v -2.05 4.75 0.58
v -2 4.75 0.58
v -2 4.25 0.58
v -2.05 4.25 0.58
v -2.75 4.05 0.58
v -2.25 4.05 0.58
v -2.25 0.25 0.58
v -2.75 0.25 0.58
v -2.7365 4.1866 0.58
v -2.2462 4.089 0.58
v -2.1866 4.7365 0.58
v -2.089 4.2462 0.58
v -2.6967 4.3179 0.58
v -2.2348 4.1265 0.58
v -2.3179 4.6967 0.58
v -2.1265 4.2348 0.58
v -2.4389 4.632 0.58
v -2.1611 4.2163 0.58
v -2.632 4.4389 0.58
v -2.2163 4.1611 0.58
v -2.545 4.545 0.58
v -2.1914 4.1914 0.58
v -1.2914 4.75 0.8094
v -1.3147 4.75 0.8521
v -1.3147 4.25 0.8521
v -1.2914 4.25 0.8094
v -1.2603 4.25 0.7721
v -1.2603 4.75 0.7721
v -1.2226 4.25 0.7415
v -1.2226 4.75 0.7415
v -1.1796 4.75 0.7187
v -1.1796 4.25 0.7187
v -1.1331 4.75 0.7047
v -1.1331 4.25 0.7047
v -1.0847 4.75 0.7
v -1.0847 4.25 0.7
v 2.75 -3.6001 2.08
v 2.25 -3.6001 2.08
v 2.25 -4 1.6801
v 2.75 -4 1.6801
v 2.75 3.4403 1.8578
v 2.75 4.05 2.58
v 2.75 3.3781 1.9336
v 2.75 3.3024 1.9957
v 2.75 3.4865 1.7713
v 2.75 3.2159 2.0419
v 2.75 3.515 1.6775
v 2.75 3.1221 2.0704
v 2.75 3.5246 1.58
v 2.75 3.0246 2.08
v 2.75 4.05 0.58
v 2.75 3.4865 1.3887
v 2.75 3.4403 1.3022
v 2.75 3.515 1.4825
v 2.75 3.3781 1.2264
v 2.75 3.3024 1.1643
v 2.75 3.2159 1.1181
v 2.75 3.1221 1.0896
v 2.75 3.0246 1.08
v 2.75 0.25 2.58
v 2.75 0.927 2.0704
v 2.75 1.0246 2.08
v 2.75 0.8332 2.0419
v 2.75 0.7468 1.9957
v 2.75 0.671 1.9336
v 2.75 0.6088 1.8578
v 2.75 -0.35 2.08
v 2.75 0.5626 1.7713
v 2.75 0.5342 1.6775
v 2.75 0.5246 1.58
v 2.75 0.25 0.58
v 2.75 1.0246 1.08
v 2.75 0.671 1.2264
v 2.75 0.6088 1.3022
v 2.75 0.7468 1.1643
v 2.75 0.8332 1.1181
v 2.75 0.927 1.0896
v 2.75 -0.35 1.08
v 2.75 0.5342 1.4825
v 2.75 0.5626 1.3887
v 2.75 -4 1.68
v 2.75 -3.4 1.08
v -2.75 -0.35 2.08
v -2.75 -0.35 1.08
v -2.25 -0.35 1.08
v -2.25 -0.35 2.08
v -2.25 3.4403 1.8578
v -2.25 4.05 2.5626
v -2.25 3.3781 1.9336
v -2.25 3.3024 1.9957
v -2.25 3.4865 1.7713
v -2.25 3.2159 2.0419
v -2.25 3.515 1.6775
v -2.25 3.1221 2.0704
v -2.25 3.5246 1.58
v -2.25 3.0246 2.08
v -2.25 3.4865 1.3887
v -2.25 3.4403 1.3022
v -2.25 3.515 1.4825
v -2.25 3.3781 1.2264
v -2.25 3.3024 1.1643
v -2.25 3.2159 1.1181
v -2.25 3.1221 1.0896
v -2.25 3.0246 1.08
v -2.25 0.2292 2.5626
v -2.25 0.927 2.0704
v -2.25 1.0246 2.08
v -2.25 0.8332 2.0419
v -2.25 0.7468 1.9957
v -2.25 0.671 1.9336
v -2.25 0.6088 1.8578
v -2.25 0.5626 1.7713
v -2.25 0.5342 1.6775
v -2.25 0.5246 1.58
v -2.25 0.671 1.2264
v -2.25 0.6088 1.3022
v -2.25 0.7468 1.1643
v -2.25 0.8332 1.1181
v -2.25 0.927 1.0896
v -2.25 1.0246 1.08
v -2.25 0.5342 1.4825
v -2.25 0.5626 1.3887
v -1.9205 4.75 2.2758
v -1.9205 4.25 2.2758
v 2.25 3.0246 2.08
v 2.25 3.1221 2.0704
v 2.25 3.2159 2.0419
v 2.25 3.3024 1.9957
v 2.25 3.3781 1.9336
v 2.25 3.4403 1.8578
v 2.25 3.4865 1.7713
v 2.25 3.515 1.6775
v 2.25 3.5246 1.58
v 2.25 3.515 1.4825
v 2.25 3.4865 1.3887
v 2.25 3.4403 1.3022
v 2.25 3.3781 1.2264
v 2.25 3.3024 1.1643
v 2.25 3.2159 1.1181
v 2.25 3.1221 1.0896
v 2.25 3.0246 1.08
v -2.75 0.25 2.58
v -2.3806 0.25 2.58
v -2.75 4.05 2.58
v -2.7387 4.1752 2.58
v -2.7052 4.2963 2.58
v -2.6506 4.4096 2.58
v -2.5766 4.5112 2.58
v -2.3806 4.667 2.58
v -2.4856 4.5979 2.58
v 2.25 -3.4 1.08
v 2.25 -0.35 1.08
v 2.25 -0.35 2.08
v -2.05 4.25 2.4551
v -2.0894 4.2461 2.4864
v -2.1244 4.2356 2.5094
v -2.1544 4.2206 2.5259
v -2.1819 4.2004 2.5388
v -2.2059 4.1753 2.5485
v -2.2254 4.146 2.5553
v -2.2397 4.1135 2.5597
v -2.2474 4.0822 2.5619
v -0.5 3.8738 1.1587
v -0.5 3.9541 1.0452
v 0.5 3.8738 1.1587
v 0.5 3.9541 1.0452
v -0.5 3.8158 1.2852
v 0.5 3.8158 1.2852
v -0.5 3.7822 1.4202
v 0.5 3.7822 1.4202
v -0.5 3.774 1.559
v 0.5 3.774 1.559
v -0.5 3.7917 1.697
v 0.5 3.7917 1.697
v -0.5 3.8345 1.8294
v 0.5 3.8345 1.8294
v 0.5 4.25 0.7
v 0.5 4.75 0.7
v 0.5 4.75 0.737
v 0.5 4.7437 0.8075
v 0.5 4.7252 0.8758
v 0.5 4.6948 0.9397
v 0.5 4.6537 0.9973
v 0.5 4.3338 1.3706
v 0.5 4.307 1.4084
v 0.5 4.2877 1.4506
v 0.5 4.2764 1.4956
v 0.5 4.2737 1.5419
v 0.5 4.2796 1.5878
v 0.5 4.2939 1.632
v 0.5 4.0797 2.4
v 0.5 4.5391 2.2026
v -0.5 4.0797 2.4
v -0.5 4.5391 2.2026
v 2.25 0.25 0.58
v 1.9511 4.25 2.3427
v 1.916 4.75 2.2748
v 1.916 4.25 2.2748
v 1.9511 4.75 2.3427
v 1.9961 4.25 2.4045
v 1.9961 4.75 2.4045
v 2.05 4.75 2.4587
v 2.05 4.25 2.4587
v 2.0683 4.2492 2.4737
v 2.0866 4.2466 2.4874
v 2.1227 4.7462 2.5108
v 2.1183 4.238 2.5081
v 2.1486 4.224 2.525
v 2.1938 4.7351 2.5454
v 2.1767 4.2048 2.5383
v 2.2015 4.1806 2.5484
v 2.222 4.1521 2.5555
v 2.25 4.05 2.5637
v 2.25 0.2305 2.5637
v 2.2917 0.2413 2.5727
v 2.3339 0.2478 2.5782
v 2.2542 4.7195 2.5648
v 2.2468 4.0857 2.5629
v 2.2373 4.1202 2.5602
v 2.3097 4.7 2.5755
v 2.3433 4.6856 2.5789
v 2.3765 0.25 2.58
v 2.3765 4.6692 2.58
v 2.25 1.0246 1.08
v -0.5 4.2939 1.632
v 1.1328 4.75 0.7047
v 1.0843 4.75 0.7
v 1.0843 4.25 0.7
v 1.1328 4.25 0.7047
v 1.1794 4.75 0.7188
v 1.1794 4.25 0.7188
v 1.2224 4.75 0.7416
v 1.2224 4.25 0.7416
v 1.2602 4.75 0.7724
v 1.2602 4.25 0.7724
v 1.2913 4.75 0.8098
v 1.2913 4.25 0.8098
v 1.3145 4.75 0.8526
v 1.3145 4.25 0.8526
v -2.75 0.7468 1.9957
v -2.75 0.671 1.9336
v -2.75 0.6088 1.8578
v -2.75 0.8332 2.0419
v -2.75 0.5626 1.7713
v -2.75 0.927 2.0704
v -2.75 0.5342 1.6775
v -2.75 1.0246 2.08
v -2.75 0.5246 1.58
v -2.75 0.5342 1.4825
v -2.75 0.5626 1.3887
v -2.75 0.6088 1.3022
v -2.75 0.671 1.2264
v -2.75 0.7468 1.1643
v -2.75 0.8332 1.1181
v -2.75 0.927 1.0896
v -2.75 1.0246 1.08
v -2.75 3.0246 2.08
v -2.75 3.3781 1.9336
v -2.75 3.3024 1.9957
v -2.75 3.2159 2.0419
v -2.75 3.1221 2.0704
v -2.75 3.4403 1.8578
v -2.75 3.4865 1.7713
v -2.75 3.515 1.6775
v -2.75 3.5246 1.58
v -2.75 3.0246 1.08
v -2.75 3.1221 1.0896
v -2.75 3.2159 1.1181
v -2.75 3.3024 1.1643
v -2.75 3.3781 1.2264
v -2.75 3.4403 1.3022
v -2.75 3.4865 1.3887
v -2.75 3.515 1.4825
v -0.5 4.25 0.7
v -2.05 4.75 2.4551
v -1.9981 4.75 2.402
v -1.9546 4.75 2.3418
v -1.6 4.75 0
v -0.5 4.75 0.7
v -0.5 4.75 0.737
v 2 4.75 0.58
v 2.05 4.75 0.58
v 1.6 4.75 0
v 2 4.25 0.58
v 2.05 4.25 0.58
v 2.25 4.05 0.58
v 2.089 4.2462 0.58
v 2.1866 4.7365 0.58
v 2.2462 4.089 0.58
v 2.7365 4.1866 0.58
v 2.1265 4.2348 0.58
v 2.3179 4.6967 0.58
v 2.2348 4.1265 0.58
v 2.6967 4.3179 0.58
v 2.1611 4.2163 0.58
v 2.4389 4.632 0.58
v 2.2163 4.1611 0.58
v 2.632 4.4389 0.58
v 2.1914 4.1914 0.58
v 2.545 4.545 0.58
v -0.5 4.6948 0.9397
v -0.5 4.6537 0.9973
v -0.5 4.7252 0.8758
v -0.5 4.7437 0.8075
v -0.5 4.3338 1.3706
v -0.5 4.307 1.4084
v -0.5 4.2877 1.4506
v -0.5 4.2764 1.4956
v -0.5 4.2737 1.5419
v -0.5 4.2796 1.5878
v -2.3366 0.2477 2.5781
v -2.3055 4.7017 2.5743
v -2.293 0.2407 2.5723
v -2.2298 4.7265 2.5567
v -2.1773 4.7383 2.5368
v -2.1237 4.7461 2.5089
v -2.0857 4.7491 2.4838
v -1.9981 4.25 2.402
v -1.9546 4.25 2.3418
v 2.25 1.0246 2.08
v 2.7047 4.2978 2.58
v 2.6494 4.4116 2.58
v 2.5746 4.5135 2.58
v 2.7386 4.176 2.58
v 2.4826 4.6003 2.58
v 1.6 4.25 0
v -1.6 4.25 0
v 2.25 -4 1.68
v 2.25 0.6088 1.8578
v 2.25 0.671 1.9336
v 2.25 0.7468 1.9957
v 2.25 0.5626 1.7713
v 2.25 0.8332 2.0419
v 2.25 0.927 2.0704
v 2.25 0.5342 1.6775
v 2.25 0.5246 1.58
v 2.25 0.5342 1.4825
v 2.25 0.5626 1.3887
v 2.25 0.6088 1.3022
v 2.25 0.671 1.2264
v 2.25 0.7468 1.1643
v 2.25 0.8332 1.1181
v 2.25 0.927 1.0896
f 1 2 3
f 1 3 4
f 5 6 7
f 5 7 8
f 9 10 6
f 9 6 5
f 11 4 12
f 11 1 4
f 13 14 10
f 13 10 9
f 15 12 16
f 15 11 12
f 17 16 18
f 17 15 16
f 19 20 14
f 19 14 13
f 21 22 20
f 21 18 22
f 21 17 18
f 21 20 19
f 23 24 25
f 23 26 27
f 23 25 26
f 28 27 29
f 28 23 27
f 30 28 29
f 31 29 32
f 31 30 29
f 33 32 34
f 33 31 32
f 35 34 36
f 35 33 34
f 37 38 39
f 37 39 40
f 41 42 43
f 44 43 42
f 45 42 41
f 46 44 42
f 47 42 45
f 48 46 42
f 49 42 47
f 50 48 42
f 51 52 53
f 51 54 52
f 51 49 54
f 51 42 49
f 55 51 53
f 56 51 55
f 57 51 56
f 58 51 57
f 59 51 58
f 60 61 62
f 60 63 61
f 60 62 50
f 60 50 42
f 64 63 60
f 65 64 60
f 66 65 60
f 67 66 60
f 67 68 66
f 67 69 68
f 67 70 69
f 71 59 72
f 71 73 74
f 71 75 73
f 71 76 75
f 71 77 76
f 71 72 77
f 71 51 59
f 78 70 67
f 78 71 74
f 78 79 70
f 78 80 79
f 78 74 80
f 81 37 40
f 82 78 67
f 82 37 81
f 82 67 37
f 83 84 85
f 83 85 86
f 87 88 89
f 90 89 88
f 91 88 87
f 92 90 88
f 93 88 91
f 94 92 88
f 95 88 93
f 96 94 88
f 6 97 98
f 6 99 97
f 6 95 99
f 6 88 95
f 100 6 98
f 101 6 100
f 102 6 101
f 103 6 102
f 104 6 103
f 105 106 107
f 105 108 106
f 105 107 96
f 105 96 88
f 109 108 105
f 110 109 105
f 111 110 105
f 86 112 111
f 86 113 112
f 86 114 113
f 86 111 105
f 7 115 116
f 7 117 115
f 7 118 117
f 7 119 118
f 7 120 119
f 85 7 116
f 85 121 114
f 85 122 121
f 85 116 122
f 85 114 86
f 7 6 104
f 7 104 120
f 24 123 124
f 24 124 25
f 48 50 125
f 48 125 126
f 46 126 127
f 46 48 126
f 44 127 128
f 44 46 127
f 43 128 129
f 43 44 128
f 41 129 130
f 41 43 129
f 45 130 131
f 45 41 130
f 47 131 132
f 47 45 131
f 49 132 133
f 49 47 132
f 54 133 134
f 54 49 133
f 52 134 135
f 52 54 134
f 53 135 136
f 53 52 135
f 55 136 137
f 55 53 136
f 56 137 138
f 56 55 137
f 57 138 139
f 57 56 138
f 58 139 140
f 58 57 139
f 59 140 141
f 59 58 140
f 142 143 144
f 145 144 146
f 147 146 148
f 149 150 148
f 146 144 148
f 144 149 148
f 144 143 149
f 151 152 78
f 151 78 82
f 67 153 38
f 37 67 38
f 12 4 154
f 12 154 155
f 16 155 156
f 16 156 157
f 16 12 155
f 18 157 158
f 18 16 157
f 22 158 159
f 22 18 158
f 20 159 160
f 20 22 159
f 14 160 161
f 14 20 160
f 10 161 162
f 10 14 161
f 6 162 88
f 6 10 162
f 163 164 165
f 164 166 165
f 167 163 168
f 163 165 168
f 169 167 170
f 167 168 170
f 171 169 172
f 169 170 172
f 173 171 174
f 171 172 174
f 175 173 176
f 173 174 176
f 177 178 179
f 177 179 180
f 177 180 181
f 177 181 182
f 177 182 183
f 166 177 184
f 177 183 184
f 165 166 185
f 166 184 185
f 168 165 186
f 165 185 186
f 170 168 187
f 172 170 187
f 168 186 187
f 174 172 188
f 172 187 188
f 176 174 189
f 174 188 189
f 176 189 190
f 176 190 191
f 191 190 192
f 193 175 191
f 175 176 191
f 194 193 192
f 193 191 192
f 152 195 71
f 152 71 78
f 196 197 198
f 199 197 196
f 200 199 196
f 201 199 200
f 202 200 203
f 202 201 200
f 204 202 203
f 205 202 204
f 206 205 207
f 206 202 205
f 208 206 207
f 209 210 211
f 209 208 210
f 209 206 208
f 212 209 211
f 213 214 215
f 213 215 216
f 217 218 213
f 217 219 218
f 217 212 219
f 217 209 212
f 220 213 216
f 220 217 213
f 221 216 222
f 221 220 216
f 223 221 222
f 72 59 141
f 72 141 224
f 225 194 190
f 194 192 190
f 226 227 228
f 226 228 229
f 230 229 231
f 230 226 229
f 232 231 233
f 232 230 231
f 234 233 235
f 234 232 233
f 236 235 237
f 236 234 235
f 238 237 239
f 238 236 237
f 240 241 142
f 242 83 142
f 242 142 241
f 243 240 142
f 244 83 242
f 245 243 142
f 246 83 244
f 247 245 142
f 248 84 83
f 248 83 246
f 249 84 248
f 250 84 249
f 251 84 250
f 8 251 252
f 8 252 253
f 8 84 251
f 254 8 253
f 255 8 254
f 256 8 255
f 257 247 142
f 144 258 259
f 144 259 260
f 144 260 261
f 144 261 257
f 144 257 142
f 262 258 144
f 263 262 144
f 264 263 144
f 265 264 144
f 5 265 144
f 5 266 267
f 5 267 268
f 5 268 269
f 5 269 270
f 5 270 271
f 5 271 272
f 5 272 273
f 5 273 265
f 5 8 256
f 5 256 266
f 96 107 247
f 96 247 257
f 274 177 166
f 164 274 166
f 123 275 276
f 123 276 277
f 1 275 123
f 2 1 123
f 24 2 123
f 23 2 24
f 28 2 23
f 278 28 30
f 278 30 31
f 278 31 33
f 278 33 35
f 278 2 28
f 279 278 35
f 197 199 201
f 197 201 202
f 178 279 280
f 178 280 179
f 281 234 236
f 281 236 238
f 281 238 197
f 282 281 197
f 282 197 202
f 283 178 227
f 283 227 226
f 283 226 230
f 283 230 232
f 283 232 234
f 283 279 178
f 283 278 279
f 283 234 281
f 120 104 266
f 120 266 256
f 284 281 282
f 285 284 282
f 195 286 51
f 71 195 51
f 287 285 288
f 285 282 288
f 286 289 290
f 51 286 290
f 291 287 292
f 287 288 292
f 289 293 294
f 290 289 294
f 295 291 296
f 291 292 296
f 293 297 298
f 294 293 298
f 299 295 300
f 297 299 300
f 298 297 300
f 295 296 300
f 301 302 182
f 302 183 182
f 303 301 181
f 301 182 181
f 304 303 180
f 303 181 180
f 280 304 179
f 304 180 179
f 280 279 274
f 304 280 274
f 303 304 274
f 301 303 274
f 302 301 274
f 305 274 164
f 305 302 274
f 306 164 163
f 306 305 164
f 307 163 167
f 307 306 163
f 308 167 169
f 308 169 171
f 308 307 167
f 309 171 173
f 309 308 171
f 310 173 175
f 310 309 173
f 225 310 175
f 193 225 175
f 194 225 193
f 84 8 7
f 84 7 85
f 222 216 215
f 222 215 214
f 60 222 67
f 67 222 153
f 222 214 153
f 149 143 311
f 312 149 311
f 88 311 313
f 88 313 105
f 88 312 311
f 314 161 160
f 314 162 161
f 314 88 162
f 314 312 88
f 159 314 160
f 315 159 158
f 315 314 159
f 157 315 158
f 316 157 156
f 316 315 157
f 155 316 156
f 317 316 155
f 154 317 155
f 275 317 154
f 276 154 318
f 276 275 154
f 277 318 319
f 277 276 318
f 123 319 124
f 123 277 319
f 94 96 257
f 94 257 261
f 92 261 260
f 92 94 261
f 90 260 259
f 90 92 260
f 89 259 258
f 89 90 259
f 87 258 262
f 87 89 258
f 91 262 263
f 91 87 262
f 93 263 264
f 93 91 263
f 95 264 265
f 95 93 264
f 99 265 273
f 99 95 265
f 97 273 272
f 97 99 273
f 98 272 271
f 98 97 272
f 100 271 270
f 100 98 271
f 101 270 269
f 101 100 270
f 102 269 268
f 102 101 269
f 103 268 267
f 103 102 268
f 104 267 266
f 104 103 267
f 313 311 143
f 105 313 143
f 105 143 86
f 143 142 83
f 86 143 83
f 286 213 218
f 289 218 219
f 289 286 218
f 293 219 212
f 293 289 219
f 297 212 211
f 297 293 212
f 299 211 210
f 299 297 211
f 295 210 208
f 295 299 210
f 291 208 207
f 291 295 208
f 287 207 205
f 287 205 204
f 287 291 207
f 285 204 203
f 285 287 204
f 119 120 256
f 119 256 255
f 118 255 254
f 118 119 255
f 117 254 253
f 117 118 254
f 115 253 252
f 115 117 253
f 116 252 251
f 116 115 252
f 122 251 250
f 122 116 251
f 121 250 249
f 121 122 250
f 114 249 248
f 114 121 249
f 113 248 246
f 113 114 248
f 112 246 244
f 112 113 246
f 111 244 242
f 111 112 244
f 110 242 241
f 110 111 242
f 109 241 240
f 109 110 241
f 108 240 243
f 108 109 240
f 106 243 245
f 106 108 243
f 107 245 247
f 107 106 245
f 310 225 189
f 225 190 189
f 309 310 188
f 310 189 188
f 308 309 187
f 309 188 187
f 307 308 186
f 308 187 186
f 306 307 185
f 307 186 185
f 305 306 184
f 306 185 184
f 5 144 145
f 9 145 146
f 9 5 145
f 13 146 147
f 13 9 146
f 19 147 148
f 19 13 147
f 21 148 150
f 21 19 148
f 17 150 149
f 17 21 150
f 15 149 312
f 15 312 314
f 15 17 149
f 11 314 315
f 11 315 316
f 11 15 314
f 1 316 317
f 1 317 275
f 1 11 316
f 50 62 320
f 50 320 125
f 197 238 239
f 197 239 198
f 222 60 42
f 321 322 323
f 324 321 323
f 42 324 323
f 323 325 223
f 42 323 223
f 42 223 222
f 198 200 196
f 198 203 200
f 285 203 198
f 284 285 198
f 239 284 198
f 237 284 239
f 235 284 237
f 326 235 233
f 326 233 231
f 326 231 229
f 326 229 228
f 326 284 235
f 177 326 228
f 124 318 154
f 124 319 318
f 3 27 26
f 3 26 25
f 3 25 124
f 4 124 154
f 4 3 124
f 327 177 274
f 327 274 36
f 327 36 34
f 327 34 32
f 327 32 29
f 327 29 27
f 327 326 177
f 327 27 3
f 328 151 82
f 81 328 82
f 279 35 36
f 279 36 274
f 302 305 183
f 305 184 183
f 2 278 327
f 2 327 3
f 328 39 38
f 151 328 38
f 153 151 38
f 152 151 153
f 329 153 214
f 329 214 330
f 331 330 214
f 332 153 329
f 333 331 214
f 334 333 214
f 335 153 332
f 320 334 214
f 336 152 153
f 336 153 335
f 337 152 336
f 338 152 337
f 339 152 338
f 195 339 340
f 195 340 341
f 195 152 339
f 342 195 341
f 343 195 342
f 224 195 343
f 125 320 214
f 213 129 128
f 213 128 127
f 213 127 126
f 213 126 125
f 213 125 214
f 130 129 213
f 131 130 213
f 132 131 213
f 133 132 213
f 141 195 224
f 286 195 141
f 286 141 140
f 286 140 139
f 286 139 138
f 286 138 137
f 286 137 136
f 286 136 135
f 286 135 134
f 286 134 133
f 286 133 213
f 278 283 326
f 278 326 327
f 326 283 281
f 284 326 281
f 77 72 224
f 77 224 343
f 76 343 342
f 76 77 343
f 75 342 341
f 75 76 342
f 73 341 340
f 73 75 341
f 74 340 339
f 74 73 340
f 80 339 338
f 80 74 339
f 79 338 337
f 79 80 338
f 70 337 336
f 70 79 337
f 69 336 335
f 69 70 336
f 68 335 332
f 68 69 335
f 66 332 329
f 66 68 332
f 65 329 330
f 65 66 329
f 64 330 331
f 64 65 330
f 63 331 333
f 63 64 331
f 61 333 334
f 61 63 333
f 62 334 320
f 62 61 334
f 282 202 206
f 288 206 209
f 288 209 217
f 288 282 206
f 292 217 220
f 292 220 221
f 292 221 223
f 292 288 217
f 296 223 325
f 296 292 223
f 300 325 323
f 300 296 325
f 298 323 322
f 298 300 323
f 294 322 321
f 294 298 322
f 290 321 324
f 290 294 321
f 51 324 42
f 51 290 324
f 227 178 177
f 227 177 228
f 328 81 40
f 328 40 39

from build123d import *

# Parameters (mm, degrees)
BOSS_EXTRUDE1_DEPTH = 2.58
CUT_EXTRUDE1_DEPTH  = 10.5
CUT_EXTRUDE2_DEPTH  = 5.25
BOSS_EXTRUDE2_DEPTH = 0.5
SKETCH5_W           = 2.430822105
SKETCH5_H           = 5.029930807
CUT_EXTRUDE3_DEPTH  = 1
CHAMFER1_SIZE       = 0.6
CHAMFER2_SIZE       = 0.4


with BuildPart() as part:
    # Sketch1 → Boss-Extrude1 (new body)
    with BuildSketch(Plane.XY):
        with BuildLine():
            Line((-2.75, -4), (-2.75, 4.05))
            ThreePointArc((-2.75, 4.05), (-2.544974747, 4.544974747), (-2.05, 4.75))
            Line((-2.05, 4.75), (2.05, 4.75))
            ThreePointArc((2.05, 4.75), (2.544974747, 4.544974747), (2.75, 4.05))
            Line((2.75, 4.05), (2.75, -4))
            Line((2.75, -4), (2.25, -4))
            Line((2.25, -4), (2.25, 4.05))
            ThreePointArc((2.25, 4.05), (2.191421356, 4.191421356), (2.05, 4.25))
            Line((2.05, 4.25), (-2.05, 4.25))
            ThreePointArc((-2.05, 4.25), (-2.191421356, 4.191421356), (-2.25, 4.05))
            Line((-2.25, 4.05), (-2.25, -4))
            Line((-2.25, -4), (-2.75, -4))
        make_face()
    extrude(amount=BOSS_EXTRUDE1_DEPTH)

    # Sketch2 → Cut-Extrude1 (cut)
    with BuildSketch(Plane(origin=(0, 4.75, 0), x_dir=(1, 0, 0), z_dir=(0, 1, 0))):
        Polygon((-2, -0.58), (-4.099439411, -0.58), (-4.099439411, 0.833357165), (-2, 0.833357165), (-1.6, 0), align=None)
        Polygon((2, -0.58), (3.357409655, -0.58), (3.357409655, 0.833357165), (2, 0.833357165), (1.6, 0), align=None)
        with BuildLine():
            Line((-2.75, -2.58), (-2.38062097, -2.58))
            ThreePointArc((-2.38062097, -2.58), (-2.104839164, -2.497066416), (-1.920543652, -2.275777582))
            Line((-1.920543652, -2.275777582), (-1.314728174, -0.852111209))
            ThreePointArc((-1.314728174, -0.852111209), (-1.222580418, -0.741466792), (-1.084689515, -0.7))
            Line((-1.084689515, -0.7), (1.084290526, -0.7))
            ThreePointArc((1.084290526, -0.7), (1.222412736, -0.741619926), (1.314545856, -0.852621958))
            Line((1.314545856, -0.852621958), (1.915985292, -2.274756083))
            ThreePointArc((1.915985292, -2.274756083), (2.100251533, -2.496760148), (2.376495952, -2.58))
            Line((2.376495952, -2.58), (2.75, -2.58))
            Line((2.75, -2.58), (2.75, -3.056093585))
            Line((2.75, -3.056093585), (-2.75, -3.056093585))
            Line((-2.75, -3.056093585), (-2.75, -2.58))
        make_face()
    extrude(amount=-CUT_EXTRUDE1_DEPTH, mode=Mode.SUBTRACT)

    # Sketch3 → Cut-Extrude2 (cut, symmetric)
    with BuildSketch(Plane(origin=(0, 0, 0), x_dir=(0, 0, -1), z_dir=(1, 0, 0))):
        Polygon((-0.58, 0.25), (-1.08, -0.35), (-1.08, -4.396314828), (-0.130305992, -4.396314828), (-0.130305992, 0.25), align=None)
        Polygon((-2.58, 0.25), (-2.08, -0.35), (-2.08, -4.896314828), (-3.070294312, -4.896314828), (-3.070294312, 0.25), align=None)
        with BuildLine():
            Line((-1.08, 3.024565065), (-1.08, 1.024565065))
            ThreePointArc((-1.08, 1.024565065), (-1.58, 0.524565065), (-2.08, 1.024565065))
            Line((-2.08, 1.024565065), (-2.08, 3.024565065))
            ThreePointArc((-2.08, 3.024565065), (-1.58, 3.524565065), (-1.08, 3.024565065))
        make_face()
    extrude(amount=CUT_EXTRUDE2_DEPTH, both=True, mode=Mode.SUBTRACT)

    # Sketch4 → Boss-Extrude2 (add, symmetric)
    with BuildSketch(Plane(origin=(0, 0, 0), x_dir=(0, 0, -1), z_dir=(1, 0, 0))):
        with BuildLine():
            Line((-0.7, 4.25), (-1.045169213, 3.954140675))
            ThreePointArc((-1.045169213, 3.954140675), (-1.420160684, 3.782160221), (-1.829373497, 3.834512432))
            Line((-1.829373497, 3.834512432), (-2.4, 4.079724782))
            Line((-2.4, 4.079724782), (-2.202592831, 4.539105245))
            Line((-2.202592831, 4.539105245), (-1.631966328, 4.293892895))
            ThreePointArc((-1.631966328, 4.293892895), (-1.495562057, 4.276442158), (-1.3705649, 4.333768976))
            Line((-1.3705649, 4.333768976), (-0.997308957, 4.653702641))
            ThreePointArc((-0.997308957, 4.653702641), (-0.875770907, 4.725154006), (-0.736992408, 4.75))
            Line((-0.736992408, 4.75), (-0.7, 4.75))
            Line((-0.7, 4.75), (-0.7, 4.25))
        make_face()
    extrude(amount=BOSS_EXTRUDE2_DEPTH, both=True)

    # Sketch5 → Cut-Extrude3 (cut)
    with BuildSketch(Plane.ZY.offset(2.75)):
        with Locations((1.671482724, -2.864965403)):
            Rectangle(SKETCH5_W, SKETCH5_H)
    extrude(amount=-CUT_EXTRUDE3_DEPTH, mode=Mode.SUBTRACT)

    # Chamfer1
    chamfer1_edges = [part.edges().sort_by_distance(p)[0] for p in [
        (2.5, -4, 1.08),
    ]]
    chamfer(chamfer1_edges, length=CHAMFER1_SIZE)

    # Chamfer2
    chamfer2_edges = [part.edges().sort_by_distance(p)[0] for p in [
        (2.5, -4, 2.08),
    ]]
    chamfer(chamfer2_edges, length=CHAMFER2_SIZE - 0.0001)  # a hair under: the kernel refuses the full size


solid = part.part
